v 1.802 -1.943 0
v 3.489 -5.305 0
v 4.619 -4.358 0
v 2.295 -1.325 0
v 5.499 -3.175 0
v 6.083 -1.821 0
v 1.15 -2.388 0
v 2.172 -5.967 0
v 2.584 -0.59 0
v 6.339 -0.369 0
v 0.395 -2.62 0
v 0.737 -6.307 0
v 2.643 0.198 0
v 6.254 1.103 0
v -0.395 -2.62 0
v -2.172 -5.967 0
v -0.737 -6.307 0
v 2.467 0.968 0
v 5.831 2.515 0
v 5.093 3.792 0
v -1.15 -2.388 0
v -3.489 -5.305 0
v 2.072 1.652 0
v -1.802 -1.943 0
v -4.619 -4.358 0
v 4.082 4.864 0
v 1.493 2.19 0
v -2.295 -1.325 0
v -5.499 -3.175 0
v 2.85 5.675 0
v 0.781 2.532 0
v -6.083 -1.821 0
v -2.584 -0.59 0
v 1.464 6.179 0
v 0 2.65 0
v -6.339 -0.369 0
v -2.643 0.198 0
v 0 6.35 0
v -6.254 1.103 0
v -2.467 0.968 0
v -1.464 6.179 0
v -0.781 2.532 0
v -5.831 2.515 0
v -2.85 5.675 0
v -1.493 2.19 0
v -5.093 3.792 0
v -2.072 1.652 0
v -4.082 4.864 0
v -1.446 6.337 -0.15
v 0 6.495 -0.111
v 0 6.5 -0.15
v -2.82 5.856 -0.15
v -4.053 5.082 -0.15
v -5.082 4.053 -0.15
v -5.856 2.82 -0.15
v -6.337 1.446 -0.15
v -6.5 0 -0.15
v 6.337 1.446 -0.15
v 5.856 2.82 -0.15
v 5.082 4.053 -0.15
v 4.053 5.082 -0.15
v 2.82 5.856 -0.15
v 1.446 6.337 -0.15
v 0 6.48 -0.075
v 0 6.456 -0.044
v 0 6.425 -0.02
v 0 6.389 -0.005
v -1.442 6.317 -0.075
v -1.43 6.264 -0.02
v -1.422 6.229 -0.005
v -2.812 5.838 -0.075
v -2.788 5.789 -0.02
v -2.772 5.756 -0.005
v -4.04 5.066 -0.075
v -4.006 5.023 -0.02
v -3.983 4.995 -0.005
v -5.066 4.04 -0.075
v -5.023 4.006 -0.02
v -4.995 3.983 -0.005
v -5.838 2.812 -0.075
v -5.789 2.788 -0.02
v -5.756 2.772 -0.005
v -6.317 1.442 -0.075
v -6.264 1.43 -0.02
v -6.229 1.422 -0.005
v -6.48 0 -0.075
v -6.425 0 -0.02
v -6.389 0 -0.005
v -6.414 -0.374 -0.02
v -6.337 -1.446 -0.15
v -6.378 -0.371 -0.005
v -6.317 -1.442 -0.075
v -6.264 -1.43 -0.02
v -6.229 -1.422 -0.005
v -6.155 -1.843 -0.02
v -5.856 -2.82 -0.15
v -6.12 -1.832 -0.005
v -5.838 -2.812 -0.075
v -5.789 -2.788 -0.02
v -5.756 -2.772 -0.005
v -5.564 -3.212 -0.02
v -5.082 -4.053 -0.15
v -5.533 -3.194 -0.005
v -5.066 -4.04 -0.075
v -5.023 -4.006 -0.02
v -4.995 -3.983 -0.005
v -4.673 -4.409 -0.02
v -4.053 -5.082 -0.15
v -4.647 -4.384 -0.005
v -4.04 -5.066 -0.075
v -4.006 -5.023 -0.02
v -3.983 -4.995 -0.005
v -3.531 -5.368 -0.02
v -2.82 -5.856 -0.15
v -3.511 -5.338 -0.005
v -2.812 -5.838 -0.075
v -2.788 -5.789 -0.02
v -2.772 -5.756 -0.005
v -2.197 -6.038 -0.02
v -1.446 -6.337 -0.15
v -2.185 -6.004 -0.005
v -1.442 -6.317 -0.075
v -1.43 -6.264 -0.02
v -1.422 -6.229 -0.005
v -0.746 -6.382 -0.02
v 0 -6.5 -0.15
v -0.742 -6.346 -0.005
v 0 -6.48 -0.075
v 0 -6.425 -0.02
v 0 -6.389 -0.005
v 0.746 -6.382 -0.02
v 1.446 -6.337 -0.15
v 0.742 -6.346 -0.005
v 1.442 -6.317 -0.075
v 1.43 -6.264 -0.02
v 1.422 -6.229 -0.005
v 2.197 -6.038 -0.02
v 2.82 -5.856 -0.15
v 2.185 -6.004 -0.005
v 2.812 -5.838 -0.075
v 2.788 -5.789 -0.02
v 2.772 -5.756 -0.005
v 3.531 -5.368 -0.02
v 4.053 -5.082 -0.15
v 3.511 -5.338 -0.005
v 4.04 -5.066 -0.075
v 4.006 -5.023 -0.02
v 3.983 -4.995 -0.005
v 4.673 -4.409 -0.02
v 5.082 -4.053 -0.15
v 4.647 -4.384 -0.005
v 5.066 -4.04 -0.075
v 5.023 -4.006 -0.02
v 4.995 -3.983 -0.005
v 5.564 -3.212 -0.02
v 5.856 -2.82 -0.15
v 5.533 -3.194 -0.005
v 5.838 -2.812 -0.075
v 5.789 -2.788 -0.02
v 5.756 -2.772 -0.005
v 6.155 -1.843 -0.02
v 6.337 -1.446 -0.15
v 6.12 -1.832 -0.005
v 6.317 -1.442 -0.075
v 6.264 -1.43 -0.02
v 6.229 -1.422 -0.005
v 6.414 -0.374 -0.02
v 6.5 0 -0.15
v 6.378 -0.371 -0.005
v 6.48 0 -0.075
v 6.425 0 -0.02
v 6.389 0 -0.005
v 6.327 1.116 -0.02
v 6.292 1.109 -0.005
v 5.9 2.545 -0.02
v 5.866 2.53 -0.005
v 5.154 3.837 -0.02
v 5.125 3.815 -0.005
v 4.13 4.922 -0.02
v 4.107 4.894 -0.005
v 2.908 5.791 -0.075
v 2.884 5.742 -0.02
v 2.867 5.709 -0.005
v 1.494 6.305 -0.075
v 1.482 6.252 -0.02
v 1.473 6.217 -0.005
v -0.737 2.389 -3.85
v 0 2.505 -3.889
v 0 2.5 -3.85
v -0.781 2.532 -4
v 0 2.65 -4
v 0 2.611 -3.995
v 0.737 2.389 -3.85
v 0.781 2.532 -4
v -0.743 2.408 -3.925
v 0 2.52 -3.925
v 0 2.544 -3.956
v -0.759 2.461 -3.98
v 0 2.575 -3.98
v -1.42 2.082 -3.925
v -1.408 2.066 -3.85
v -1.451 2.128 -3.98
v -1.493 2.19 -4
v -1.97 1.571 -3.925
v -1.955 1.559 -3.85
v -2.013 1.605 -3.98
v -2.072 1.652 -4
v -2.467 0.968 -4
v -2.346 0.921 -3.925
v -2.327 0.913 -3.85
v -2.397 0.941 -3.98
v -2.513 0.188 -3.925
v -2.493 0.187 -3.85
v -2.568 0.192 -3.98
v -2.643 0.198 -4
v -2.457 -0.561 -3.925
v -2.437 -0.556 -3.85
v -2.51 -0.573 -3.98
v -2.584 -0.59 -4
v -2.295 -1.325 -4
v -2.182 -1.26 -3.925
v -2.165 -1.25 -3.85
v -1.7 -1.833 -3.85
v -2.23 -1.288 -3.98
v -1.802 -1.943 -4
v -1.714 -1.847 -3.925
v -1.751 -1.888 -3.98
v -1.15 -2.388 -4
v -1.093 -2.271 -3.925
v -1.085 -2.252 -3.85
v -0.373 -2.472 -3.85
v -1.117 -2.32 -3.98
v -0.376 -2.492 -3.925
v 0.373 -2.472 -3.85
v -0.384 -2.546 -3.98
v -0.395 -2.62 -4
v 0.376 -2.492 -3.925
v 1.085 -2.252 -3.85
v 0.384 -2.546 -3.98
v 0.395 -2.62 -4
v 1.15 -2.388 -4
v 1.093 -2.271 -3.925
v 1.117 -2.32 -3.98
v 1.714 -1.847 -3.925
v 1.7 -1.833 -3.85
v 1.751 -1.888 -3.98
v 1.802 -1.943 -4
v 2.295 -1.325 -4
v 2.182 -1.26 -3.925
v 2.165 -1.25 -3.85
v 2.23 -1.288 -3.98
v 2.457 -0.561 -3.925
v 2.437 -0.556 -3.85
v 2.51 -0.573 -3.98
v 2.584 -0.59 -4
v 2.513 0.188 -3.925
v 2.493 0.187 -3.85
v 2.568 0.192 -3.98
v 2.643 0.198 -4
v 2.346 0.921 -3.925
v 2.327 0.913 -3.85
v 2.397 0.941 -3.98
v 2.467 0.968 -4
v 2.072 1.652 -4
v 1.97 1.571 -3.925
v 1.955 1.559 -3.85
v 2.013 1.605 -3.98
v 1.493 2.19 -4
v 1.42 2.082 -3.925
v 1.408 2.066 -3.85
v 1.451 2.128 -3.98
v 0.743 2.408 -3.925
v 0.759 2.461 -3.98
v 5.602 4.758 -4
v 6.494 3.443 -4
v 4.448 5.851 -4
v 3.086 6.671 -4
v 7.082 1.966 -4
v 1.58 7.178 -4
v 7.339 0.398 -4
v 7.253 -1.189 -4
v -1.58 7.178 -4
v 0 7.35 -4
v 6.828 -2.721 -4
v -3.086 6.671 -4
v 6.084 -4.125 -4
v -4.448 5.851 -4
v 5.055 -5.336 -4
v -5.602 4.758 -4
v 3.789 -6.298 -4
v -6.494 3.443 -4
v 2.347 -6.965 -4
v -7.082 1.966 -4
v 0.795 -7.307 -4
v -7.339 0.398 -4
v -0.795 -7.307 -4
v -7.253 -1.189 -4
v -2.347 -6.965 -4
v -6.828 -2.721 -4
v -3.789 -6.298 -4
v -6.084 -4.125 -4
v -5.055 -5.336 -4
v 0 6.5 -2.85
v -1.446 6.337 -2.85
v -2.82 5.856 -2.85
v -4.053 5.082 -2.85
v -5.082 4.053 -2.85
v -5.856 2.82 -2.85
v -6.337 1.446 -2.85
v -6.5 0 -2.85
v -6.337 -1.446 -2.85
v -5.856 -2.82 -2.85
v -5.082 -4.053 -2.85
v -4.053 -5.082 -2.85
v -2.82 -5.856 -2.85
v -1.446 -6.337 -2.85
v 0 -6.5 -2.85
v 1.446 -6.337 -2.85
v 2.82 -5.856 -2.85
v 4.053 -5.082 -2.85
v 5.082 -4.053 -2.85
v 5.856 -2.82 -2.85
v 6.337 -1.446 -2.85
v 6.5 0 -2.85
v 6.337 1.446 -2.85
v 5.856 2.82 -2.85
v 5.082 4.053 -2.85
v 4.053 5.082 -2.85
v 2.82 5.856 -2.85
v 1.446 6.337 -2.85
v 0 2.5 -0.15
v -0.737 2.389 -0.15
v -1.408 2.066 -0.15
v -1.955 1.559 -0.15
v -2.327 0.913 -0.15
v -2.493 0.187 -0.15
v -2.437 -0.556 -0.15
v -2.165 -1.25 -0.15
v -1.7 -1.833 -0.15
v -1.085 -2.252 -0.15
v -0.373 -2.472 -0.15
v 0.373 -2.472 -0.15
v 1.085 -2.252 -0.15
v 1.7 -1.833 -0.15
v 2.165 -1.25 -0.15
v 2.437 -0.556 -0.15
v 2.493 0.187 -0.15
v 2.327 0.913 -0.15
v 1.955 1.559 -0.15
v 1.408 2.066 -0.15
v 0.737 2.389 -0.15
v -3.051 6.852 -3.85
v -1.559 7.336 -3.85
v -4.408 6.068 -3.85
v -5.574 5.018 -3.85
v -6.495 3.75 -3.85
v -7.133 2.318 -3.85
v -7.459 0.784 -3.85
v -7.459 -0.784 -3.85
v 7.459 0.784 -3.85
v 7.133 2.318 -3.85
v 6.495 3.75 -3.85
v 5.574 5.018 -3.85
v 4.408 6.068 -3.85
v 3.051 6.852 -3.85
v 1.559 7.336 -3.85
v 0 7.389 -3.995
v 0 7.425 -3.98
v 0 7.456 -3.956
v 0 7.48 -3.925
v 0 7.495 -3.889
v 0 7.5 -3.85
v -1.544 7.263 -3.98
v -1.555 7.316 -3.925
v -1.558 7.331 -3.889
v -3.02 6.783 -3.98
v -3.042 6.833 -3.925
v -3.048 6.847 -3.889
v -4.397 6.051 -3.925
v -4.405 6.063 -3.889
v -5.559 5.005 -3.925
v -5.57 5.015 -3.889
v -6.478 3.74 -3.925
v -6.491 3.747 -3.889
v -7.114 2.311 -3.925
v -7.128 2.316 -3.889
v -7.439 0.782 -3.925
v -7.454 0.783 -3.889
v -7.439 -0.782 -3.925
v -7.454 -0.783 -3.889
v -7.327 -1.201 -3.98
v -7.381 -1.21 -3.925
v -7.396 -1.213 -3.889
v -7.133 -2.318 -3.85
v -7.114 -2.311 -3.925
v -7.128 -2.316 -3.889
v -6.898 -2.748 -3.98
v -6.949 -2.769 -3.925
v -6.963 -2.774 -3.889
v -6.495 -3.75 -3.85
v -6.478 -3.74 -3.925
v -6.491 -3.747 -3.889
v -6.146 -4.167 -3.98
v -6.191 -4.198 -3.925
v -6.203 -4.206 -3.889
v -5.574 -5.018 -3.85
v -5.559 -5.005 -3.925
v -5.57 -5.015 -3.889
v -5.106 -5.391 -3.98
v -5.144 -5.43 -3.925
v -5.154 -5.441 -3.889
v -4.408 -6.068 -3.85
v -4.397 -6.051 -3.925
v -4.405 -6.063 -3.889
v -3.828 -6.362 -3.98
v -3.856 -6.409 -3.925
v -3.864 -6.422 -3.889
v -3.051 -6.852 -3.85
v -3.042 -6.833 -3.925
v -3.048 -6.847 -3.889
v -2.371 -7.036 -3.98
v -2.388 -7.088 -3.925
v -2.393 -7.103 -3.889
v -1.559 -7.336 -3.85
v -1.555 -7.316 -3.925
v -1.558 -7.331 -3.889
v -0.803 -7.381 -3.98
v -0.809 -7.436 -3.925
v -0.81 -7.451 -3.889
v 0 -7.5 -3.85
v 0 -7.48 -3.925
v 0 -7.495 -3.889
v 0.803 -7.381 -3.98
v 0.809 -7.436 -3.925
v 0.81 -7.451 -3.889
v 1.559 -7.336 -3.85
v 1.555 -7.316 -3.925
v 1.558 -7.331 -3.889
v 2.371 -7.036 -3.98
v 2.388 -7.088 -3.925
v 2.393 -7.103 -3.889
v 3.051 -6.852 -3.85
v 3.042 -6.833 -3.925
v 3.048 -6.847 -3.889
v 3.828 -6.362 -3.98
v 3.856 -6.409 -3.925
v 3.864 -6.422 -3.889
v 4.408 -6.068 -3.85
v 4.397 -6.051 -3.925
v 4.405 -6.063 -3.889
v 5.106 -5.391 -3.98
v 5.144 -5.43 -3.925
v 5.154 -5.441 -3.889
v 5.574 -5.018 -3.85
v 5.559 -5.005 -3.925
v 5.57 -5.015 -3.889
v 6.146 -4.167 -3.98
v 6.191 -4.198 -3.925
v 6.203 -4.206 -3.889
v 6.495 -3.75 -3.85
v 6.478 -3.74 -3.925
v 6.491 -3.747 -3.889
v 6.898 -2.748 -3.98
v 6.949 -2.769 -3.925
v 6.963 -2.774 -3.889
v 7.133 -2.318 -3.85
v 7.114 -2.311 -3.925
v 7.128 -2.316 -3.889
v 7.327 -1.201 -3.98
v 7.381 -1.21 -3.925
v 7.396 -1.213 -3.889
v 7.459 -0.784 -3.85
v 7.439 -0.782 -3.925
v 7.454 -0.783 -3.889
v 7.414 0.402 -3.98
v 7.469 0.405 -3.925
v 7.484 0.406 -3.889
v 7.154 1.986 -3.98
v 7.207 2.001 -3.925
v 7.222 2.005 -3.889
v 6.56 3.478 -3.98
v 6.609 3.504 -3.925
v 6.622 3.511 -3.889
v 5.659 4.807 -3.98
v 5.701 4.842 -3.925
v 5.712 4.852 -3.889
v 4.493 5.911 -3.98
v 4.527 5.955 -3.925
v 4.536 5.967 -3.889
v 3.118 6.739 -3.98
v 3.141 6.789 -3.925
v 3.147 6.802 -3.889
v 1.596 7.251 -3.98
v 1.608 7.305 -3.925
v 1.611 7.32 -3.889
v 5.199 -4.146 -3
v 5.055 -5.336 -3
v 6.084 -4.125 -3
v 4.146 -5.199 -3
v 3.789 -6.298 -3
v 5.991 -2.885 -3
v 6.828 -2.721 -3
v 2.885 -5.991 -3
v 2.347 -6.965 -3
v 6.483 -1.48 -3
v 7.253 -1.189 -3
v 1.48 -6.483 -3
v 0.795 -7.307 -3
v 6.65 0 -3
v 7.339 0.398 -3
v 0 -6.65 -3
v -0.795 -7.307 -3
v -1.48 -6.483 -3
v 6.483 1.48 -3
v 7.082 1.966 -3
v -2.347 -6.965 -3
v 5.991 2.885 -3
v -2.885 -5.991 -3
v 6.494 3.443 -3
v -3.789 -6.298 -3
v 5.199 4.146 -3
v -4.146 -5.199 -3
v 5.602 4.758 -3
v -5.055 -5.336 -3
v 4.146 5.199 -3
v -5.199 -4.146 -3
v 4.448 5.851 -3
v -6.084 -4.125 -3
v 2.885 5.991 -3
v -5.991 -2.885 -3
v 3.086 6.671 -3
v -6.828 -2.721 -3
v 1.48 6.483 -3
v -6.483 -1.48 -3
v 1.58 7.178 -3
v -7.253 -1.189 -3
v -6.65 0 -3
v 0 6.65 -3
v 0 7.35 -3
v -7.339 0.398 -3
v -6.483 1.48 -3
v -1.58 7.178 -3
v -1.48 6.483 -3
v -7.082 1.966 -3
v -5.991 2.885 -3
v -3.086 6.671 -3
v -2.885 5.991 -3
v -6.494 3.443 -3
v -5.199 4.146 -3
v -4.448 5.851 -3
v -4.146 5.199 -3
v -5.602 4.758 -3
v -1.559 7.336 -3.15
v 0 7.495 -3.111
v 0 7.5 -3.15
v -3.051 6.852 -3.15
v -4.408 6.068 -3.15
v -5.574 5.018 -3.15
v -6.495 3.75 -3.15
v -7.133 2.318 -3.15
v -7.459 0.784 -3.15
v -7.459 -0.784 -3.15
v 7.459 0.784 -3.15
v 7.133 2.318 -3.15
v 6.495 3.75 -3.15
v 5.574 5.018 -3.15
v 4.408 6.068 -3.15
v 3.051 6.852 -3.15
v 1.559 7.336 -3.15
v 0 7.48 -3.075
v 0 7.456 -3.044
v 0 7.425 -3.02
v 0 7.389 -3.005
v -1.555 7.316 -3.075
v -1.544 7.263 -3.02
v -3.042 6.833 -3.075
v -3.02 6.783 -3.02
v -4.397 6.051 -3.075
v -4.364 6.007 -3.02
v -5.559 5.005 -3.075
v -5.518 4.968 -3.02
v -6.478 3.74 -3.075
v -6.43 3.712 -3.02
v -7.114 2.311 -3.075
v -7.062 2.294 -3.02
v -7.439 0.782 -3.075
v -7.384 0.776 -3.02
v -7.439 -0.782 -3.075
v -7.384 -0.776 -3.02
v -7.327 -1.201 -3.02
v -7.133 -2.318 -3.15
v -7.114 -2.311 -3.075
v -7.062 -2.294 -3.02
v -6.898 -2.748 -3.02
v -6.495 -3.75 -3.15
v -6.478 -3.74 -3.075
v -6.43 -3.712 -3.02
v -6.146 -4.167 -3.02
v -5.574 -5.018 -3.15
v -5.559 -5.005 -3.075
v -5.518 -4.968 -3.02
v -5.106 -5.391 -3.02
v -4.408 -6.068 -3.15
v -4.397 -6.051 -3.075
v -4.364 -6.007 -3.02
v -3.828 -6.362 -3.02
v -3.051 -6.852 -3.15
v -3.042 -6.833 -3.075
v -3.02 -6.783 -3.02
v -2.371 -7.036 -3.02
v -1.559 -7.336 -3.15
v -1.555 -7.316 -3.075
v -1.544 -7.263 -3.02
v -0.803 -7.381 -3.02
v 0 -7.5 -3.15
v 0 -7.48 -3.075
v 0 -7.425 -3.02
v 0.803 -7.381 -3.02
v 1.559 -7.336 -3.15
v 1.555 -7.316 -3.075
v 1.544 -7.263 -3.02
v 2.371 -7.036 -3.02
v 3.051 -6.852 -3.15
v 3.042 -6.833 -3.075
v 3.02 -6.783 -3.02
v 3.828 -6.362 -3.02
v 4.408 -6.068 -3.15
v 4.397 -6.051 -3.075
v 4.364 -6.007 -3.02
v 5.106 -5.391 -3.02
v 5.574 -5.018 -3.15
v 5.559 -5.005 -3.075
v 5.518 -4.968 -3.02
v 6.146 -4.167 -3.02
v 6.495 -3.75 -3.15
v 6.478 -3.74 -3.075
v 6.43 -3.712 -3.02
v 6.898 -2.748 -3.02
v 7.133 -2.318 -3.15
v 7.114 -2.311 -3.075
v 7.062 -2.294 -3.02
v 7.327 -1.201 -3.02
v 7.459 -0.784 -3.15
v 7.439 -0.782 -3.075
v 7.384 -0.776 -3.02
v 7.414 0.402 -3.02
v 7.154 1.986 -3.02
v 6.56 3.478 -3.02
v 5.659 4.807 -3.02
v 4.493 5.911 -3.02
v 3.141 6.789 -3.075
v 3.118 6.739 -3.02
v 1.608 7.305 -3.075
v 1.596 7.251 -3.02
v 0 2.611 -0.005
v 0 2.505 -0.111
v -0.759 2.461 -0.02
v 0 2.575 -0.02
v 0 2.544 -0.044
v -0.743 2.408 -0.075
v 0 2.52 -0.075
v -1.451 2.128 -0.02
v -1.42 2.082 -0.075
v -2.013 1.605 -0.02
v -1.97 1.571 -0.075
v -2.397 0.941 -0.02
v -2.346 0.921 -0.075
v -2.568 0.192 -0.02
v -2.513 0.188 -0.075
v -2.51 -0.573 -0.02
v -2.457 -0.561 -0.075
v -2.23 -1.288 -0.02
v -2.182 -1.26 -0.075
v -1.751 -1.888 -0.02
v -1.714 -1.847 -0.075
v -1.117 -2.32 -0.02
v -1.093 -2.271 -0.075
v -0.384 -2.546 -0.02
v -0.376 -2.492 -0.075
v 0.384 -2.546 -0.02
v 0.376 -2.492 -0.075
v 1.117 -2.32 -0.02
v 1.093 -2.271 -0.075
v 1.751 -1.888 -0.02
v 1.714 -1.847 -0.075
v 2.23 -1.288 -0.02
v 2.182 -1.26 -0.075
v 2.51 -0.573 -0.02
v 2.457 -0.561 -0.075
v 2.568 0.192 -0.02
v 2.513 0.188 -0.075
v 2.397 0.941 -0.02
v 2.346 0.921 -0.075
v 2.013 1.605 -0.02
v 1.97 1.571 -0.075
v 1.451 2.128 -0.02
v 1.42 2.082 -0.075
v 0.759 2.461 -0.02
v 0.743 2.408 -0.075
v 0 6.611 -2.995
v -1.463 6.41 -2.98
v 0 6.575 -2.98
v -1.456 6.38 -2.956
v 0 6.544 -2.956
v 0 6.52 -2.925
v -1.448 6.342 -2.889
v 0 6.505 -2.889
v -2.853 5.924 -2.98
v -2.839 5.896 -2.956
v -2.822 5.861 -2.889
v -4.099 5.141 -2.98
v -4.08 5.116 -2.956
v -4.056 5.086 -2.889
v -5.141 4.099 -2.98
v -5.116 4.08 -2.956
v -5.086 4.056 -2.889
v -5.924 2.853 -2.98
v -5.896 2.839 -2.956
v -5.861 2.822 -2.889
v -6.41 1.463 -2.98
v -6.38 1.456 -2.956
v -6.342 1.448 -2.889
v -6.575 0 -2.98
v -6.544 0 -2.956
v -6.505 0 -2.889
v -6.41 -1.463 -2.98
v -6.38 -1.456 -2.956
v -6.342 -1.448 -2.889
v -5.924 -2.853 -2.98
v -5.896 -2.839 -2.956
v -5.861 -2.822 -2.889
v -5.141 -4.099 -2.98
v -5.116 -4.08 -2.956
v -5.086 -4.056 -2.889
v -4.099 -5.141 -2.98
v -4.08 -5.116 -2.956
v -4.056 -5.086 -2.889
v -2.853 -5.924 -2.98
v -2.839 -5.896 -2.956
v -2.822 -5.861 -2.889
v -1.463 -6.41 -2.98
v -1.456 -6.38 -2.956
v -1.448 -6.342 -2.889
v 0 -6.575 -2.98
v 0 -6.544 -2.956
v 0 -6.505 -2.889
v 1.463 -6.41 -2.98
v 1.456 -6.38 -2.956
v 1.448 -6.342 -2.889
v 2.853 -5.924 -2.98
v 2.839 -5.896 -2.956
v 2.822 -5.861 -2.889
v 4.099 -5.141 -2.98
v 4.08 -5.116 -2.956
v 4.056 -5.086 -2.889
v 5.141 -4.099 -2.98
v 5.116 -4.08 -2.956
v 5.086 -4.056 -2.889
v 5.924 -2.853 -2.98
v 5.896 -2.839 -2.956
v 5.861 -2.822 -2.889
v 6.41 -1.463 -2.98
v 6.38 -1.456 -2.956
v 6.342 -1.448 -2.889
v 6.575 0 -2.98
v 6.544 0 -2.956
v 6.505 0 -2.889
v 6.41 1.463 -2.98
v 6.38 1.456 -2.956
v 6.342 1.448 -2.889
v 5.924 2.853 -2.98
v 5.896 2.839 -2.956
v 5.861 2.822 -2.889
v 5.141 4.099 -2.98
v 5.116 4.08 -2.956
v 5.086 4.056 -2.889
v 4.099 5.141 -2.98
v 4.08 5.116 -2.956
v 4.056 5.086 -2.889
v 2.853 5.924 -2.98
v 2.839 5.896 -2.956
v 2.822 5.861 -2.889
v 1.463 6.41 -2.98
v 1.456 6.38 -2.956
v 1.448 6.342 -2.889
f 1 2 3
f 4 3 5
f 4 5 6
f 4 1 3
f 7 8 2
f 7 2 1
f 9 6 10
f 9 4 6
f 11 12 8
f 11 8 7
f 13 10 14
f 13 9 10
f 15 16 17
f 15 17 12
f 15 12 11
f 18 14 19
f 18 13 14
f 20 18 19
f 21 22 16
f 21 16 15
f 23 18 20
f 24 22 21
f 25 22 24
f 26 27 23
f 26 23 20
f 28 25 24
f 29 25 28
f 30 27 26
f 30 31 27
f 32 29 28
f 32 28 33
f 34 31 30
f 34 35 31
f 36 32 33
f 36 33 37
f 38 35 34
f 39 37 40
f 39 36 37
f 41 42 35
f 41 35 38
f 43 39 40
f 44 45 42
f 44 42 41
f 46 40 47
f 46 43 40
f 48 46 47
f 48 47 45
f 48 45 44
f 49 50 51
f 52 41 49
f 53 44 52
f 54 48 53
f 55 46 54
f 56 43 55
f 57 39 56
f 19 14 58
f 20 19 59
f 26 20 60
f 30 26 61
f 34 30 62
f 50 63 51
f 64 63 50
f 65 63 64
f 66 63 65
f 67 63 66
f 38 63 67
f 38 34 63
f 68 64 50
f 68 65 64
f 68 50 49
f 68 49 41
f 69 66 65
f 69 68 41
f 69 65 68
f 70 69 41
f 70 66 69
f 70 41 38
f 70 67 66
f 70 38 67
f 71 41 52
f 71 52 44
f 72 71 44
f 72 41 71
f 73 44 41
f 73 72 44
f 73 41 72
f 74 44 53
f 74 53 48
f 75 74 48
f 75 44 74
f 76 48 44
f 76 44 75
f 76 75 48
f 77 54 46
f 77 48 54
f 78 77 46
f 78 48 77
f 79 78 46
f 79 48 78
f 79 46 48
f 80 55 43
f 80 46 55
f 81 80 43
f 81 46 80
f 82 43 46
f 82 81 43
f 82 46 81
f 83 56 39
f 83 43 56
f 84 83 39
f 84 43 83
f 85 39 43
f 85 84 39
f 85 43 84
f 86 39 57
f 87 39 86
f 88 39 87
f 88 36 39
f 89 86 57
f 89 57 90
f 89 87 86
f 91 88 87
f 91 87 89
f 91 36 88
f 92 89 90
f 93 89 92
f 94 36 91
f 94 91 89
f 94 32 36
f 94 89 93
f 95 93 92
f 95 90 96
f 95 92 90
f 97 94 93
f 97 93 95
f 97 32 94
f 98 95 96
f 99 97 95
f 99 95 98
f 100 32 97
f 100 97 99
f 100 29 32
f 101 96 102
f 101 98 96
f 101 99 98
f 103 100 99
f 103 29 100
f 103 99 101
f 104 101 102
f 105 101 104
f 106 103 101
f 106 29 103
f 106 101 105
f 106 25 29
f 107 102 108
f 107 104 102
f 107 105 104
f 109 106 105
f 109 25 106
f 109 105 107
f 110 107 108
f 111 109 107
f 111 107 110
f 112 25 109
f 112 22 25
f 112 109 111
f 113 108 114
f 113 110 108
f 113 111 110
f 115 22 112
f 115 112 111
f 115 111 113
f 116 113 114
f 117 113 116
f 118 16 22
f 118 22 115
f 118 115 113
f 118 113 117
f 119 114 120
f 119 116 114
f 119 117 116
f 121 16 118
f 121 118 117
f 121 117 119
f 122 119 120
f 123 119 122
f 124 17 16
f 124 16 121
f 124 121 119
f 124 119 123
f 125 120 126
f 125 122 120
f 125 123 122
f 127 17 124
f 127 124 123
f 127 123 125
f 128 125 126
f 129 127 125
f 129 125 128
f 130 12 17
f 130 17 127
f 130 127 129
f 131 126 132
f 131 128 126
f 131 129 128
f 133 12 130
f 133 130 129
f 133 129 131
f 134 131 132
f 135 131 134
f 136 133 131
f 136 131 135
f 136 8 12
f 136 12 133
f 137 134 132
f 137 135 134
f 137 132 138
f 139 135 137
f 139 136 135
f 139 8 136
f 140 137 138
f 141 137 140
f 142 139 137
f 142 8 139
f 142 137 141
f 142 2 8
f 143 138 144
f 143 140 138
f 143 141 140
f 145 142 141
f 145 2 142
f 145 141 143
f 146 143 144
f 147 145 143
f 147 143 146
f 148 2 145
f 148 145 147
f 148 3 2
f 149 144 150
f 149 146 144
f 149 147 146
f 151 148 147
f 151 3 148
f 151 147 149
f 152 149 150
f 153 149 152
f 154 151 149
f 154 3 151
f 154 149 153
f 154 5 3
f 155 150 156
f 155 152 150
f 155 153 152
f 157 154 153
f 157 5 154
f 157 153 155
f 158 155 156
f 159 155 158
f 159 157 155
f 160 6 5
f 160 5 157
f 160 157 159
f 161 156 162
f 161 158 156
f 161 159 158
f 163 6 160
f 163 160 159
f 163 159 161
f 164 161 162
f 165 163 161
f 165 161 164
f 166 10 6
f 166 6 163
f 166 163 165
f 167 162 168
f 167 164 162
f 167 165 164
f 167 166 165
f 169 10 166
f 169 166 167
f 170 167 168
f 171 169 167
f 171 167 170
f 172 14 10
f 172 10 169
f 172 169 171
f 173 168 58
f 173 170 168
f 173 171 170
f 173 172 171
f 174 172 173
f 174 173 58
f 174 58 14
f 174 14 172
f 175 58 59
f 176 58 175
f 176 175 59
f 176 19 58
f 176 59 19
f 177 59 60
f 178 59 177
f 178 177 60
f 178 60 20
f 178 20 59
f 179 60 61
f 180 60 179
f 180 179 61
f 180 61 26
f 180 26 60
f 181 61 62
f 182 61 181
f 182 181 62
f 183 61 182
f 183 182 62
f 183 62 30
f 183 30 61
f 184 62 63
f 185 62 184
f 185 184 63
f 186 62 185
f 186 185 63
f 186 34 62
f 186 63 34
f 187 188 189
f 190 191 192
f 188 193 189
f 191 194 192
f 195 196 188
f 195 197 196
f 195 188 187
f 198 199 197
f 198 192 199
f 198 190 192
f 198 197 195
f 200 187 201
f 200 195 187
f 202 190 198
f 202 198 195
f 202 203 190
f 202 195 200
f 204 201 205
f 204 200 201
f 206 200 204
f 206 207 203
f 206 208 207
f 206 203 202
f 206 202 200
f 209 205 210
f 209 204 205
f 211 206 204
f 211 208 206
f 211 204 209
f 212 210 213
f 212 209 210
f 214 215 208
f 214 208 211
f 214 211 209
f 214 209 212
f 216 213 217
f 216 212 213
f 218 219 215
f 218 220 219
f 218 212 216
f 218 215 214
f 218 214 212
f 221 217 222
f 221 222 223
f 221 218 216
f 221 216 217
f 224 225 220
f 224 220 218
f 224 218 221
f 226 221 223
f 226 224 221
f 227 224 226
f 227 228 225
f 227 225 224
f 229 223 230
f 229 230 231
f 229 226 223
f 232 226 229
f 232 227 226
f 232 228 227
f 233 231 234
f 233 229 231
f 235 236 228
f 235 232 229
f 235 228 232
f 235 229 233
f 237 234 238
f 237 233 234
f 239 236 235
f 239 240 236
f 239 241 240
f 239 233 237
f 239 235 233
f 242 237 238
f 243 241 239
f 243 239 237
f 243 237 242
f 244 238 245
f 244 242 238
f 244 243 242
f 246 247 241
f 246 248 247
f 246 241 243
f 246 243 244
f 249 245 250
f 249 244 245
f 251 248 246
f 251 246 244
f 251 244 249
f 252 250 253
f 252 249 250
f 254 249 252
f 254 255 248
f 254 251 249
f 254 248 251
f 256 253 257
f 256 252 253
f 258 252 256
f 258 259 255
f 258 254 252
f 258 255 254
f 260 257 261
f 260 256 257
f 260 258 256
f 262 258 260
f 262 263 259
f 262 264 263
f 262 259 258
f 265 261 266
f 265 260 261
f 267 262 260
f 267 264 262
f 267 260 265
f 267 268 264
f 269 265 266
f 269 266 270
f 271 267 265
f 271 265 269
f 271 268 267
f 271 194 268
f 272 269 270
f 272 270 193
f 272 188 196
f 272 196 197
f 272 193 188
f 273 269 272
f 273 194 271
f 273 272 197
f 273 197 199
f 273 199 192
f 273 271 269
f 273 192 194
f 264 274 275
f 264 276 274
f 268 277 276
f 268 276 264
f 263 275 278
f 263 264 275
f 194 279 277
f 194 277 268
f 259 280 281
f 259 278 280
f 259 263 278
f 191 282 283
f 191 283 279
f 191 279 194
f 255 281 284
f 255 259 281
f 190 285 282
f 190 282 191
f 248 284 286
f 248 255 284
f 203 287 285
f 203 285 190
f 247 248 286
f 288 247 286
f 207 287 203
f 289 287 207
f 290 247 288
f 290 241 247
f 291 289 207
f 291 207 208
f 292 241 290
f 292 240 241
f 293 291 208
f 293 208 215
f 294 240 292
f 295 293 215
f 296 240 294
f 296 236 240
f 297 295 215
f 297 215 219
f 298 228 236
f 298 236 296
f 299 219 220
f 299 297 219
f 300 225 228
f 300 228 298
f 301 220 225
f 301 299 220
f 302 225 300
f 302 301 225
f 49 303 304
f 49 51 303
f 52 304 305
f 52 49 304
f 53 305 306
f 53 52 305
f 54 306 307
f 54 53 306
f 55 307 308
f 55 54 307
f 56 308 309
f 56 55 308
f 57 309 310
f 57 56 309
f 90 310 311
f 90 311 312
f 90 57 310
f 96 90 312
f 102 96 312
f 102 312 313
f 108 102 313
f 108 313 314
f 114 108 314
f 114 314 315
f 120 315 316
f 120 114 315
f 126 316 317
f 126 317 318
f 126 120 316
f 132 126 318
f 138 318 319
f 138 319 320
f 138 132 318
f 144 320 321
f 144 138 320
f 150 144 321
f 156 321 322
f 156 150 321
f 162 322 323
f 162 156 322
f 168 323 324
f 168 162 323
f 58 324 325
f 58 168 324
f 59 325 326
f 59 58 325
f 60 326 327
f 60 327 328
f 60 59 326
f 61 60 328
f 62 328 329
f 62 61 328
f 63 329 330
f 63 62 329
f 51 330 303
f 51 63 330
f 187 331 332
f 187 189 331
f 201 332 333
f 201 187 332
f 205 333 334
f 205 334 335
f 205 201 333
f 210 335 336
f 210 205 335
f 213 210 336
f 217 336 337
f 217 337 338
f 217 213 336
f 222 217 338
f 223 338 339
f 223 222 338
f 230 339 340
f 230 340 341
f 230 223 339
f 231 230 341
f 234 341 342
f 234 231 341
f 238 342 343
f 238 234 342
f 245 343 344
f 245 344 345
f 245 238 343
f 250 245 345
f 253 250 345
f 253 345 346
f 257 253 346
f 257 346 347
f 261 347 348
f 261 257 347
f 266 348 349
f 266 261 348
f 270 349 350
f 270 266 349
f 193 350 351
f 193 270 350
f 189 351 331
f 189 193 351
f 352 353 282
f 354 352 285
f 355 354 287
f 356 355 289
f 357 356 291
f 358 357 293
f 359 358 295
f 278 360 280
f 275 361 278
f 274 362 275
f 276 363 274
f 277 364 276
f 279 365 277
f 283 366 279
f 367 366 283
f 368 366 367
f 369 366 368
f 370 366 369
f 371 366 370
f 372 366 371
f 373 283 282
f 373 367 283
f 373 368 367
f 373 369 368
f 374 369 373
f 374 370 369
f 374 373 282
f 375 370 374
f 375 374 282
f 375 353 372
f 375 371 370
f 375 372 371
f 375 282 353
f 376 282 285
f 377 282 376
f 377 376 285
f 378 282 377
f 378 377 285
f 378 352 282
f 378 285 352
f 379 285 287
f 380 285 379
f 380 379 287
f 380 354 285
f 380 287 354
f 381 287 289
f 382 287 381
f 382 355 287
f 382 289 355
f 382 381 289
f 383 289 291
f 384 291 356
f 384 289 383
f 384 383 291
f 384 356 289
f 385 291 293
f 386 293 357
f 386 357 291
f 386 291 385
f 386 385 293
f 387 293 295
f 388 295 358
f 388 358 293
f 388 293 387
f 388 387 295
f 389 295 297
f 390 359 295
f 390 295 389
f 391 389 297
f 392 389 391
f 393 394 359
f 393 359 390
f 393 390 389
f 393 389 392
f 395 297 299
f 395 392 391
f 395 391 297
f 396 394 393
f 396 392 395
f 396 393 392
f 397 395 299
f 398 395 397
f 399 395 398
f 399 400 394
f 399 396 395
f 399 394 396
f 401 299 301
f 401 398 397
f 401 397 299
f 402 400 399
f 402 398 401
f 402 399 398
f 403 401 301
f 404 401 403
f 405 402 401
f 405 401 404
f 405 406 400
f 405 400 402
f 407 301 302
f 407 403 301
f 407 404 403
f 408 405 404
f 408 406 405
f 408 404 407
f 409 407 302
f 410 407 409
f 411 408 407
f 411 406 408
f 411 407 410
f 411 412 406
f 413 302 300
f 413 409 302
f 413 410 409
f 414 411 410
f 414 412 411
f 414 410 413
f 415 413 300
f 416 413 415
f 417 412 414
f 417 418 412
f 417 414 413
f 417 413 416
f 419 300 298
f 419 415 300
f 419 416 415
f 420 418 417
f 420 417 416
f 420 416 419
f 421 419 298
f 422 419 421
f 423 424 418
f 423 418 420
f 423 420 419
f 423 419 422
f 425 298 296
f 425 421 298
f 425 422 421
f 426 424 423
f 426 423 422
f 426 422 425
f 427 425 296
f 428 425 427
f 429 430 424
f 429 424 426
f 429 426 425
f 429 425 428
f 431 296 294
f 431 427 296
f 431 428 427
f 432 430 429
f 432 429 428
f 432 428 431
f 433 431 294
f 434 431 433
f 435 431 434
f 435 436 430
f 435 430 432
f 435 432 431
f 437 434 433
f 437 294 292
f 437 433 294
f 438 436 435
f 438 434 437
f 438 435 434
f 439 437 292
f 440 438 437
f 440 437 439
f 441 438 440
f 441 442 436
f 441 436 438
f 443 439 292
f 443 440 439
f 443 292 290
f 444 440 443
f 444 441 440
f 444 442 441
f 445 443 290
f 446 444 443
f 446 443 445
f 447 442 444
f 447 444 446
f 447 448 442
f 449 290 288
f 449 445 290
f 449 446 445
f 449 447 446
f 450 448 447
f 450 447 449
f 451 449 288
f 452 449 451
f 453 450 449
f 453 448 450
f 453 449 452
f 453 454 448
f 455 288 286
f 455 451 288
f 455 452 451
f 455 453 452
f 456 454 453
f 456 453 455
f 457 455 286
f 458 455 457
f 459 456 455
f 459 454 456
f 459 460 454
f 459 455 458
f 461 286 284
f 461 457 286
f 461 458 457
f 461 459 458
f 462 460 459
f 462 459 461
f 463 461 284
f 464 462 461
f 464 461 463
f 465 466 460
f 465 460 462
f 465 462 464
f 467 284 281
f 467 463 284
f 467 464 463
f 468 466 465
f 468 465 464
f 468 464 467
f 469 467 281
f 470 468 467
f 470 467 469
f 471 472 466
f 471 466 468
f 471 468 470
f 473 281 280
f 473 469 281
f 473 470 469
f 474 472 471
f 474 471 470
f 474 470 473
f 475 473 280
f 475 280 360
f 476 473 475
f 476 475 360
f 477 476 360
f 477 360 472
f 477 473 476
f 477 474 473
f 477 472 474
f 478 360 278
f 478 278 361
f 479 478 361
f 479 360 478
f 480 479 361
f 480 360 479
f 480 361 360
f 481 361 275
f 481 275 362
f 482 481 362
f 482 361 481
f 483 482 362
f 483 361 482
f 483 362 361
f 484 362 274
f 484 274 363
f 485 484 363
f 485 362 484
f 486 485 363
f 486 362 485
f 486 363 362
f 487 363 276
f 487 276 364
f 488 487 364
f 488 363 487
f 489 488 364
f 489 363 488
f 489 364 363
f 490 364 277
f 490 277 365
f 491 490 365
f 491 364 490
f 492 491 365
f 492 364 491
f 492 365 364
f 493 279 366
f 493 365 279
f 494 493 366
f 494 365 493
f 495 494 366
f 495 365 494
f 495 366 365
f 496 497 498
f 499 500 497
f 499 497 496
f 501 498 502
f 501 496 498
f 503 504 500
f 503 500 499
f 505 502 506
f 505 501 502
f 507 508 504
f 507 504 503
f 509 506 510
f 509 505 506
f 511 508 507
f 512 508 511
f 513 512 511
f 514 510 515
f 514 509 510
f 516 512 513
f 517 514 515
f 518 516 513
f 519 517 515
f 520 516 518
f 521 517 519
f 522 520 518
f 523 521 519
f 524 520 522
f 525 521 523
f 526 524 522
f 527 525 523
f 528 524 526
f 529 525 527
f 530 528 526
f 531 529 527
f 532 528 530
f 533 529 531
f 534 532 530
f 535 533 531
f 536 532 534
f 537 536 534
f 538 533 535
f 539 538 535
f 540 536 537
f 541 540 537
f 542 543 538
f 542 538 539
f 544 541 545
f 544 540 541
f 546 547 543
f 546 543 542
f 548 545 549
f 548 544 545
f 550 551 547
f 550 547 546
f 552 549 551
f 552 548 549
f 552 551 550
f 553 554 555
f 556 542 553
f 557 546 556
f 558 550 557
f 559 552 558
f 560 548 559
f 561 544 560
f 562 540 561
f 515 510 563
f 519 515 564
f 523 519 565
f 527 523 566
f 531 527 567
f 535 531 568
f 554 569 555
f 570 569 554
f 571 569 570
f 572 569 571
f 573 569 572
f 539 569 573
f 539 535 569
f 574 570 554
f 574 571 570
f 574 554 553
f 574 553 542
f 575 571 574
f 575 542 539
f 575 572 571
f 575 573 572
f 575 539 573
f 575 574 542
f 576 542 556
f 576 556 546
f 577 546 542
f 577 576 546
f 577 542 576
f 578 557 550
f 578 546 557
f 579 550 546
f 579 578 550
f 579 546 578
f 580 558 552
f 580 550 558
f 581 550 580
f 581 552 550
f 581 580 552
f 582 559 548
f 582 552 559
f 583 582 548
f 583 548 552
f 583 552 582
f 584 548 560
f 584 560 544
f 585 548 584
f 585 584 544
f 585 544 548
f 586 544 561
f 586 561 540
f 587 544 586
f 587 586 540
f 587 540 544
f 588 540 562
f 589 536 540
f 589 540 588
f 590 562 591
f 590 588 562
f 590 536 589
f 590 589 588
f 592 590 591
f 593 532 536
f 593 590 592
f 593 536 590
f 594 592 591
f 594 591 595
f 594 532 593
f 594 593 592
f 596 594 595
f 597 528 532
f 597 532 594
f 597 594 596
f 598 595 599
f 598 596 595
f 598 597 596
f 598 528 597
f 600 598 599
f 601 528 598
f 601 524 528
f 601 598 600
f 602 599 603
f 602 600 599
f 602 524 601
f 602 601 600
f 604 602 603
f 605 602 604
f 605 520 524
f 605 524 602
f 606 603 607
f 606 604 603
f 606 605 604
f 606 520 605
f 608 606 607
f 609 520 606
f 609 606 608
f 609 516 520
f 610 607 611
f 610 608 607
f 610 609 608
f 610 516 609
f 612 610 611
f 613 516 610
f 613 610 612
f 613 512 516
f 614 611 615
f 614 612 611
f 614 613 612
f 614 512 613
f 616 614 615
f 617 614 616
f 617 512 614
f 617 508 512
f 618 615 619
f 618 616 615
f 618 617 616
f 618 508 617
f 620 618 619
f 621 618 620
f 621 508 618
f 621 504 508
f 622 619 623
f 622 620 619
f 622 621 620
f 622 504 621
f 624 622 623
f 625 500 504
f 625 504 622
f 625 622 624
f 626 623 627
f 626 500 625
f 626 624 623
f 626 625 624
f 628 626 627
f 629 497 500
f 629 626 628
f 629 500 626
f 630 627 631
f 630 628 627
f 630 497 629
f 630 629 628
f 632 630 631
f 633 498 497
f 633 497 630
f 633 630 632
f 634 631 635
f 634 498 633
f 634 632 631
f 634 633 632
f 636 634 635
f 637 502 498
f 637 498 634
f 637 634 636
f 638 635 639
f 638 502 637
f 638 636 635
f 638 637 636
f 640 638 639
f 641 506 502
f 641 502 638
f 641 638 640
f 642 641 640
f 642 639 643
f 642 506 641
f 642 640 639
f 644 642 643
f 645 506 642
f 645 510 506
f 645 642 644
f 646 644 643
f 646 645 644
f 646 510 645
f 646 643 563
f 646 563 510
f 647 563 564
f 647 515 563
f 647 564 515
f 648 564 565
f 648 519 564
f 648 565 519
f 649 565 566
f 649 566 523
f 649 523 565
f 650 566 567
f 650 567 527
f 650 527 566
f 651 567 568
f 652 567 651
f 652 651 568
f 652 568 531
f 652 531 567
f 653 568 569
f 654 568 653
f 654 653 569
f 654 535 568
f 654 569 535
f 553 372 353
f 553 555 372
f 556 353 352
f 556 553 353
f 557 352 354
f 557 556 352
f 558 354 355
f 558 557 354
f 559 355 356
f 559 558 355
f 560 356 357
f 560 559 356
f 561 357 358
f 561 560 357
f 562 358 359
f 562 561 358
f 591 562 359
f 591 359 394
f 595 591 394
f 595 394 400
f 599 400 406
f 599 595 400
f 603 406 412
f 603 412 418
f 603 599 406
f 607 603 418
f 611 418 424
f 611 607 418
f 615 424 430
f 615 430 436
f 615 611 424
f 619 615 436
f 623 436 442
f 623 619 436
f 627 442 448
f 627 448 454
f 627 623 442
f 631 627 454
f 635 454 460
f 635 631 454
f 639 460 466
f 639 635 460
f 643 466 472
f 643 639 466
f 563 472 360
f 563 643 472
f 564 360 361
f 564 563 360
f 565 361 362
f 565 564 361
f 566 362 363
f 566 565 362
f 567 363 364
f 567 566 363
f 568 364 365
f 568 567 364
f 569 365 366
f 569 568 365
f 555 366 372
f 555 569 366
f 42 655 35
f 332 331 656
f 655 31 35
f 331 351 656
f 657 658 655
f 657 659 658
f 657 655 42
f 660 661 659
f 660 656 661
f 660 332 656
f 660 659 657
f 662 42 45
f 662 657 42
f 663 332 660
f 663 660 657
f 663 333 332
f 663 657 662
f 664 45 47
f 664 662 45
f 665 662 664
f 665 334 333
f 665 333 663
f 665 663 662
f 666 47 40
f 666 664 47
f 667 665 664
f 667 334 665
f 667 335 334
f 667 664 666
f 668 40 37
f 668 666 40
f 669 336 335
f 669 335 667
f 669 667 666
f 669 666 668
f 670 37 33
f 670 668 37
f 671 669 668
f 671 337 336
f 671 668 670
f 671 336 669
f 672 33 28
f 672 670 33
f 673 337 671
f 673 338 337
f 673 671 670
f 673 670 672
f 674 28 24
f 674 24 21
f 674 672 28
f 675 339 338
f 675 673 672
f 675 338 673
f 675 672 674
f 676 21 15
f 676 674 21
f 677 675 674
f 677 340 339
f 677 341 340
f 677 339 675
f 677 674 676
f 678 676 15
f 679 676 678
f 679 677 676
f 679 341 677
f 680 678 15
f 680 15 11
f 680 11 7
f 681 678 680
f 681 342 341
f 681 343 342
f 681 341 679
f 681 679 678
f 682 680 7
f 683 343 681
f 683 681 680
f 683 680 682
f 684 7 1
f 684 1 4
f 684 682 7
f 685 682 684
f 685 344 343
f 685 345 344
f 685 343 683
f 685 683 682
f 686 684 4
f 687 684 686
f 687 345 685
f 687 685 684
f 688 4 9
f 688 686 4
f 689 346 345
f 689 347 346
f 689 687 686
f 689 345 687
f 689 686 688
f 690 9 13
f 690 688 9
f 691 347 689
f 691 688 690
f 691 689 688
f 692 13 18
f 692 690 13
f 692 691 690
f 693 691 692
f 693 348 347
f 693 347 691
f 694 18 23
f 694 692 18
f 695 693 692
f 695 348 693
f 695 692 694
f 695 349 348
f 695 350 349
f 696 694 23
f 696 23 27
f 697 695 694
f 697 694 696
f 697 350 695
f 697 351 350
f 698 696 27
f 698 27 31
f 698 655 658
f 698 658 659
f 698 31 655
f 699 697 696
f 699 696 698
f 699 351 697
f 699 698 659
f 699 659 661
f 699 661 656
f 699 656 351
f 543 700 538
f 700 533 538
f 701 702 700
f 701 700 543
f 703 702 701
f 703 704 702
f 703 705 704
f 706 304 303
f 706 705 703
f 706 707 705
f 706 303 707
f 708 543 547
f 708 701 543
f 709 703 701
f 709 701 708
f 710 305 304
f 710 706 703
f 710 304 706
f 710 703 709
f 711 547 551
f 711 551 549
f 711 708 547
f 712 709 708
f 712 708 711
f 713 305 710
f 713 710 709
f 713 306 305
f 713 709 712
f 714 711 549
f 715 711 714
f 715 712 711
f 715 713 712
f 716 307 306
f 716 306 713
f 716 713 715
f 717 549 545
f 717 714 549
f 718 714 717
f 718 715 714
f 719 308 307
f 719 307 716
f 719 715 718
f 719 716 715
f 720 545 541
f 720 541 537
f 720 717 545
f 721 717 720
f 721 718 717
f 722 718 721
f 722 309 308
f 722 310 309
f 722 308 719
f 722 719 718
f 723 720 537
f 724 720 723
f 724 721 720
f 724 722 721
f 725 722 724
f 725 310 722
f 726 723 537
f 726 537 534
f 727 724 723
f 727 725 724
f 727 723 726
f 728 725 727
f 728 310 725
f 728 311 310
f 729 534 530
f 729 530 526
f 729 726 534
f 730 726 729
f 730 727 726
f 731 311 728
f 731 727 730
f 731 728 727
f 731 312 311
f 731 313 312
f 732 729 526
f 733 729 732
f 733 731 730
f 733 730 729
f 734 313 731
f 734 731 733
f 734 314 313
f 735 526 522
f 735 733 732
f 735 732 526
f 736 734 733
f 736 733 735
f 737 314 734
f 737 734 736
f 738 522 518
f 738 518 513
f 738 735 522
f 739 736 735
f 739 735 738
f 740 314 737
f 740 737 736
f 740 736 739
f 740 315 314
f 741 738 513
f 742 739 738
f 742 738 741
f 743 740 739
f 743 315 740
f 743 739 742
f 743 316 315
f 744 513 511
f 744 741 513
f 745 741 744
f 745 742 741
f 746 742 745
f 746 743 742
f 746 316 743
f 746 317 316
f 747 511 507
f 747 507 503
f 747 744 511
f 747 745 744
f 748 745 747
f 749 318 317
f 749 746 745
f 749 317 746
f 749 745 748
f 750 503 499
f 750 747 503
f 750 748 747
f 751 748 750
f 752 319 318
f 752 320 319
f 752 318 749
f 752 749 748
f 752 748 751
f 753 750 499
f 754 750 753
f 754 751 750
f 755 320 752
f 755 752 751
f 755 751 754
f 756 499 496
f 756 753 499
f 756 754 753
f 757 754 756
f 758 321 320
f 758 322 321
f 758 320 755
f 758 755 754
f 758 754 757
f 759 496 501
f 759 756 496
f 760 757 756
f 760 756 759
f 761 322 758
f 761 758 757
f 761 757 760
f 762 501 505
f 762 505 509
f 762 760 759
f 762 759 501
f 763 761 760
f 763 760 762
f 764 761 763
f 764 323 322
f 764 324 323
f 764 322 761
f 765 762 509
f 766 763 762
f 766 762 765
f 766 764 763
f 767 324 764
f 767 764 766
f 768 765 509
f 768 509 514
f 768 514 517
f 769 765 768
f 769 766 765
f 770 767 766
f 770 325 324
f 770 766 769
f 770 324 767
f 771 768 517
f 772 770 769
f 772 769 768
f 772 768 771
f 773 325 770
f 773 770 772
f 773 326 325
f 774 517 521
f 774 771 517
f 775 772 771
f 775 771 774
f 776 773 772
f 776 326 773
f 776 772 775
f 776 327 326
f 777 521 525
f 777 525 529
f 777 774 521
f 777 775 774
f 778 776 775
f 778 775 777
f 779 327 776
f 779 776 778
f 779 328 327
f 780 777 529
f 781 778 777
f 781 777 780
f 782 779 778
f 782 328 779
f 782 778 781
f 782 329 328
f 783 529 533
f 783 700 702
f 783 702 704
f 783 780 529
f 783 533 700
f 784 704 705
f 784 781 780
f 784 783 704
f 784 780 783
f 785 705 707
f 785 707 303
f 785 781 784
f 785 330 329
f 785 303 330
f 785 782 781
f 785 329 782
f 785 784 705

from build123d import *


with BuildPart() as part:
    # Sketch1 → Revolve1 (revolve)
    with BuildSketch(Plane(origin=(0, 0, 0), x_dir=(0, 0, -1), z_dir=(1, 0, 0))):
        with BuildLine():
            Line((4, 2.65), (4, 7.35))
            ThreePointArc((4, 7.35), (3.956066017, 7.456066017), (3.85, 7.5))
            Line((3.85, 7.5), (3.15, 7.5))
            ThreePointArc((3.15, 7.5), (3.043933983, 7.456066017), (3, 7.35))
            Line((3, 7.35), (3, 6.65))
            ThreePointArc((3, 6.65), (2.956066017, 6.543933983), (2.85, 6.5))
            Line((2.85, 6.5), (0.15, 6.5))
            ThreePointArc((0.15, 6.5), (0.043933983, 6.456066017), (0, 6.35))
            Line((0, 6.35), (0, 2.65))
            ThreePointArc((0, 2.65), (0.043933983, 2.543933983), (0.15, 2.5))
            Line((0.15, 2.5), (3.85, 2.5))
            ThreePointArc((3.85, 2.5), (3.956066017, 2.543933983), (4, 2.65))
        make_face()
    revolve(axis=Axis((0, 0, 0), (0, 0, 1)))


solid = part.part
